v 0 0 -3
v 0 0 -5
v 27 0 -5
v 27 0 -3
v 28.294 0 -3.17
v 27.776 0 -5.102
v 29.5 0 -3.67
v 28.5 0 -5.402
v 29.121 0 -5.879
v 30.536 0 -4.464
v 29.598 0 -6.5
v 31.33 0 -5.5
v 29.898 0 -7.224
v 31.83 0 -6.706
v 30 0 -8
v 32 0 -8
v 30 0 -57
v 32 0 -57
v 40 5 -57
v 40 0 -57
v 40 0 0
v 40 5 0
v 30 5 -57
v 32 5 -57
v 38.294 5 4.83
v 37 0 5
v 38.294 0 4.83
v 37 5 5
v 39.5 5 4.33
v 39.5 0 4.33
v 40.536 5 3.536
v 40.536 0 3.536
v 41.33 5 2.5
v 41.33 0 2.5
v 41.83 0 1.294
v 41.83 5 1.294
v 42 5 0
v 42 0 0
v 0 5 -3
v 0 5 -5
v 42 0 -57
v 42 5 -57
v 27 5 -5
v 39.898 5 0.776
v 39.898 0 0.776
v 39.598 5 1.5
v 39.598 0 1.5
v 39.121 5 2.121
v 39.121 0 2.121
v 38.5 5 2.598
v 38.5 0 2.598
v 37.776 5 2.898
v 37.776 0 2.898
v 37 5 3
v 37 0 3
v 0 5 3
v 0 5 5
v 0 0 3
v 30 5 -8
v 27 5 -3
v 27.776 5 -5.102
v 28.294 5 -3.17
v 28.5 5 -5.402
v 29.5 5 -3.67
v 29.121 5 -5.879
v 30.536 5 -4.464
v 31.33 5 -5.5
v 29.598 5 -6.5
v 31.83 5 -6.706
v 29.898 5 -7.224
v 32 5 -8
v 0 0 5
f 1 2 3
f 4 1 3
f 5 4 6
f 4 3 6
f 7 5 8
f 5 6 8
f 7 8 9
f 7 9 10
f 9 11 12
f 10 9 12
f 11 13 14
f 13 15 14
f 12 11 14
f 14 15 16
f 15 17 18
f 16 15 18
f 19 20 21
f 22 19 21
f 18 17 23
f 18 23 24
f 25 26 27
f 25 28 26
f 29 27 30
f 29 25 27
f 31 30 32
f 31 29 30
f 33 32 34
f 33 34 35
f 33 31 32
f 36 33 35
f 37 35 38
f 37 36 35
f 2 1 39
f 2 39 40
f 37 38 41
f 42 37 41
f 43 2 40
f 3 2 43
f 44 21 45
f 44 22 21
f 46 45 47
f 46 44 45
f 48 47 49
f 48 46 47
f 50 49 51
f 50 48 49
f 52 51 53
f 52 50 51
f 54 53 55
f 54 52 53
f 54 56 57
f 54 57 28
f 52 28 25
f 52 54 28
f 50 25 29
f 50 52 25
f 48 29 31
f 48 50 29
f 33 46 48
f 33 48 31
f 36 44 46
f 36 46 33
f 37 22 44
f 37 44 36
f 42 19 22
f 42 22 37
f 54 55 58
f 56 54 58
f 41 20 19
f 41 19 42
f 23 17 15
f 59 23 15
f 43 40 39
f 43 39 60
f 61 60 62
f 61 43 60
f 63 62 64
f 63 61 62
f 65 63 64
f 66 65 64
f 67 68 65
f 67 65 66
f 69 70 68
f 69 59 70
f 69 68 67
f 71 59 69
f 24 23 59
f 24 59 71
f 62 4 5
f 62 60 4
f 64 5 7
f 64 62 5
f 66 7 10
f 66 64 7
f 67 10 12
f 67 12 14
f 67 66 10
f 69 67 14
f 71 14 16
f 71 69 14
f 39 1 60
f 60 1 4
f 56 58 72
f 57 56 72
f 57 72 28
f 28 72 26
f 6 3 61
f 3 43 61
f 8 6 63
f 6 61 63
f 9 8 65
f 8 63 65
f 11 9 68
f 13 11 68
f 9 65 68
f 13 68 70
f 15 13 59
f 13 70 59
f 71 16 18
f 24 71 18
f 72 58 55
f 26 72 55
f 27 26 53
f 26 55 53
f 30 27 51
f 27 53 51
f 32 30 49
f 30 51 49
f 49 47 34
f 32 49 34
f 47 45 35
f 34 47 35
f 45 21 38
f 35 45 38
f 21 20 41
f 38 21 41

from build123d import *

# Parameters (mm, degrees)
SKETCH_1_W               = 30
SKETCH_1_H               = 2
SKETCH_1_W_2             = 2
SKETCH_1_H_2             = 52
SKETCH_1_W_3             = 12
SKETCH_1_H_3             = 3
EXTRUDE_1_DEPTH          = 5
FILLET_1_R               = 5
FILLET_2_R               = 3
CUT_EXTRUDE_1_DEPTH      = 74.409808609
CUT_EXTRUDE_1_DEPTH_BACK = 74.409808609
SKETCH_2_W               = 12
SKETCH_2_H               = 3


with BuildPart() as part:
    # 草图1 → 凸台-拉伸1 (new body)
    with BuildSketch(Plane(origin=(0, 0, 0), x_dir=(1, 0, 0), z_dir=(0, 1, 0))):
        with Locations((15, 4)):
            Rectangle(SKETCH_1_W, SKETCH_1_H)
        Polygon((0, -5), (40, -5), (40, -3), (32, -3), (30, -3), (0, -3), align=None)
        with Locations((41, -4)):
            Rectangle(SKETCH_1_W_2, SKETCH_1_H)
        Polygon((40, 3), (40, -3), (42, -3), (42, 57), (40, 57), (40, 5), align=None)
        with Locations((31, 31)):
            Rectangle(SKETCH_1_W_2, SKETCH_1_H_2)
        with Locations((31, 4)):
            Rectangle(SKETCH_1_W_2, SKETCH_1_H)
        with Locations((36, 58.5)):
            Rectangle(SKETCH_1_W_3, SKETCH_1_H_3)
    extrude(amount=EXTRUDE_1_DEPTH)

    # 圆角1
    fillet_1_edges = [part.edges().sort_by_distance(p)[0] for p in [
        (42, 2.5, 5),
        (32, 2.5, -3),
    ]]
    fillet(fillet_1_edges, radius=FILLET_1_R)

    # 圆角2
    fillet_2_edges = [part.edges().sort_by_distance(p)[0] for p in [
        (40, 2.5, 3),
        (30, 2.5, -5),
    ]]
    fillet(fillet_2_edges, radius=FILLET_2_R)

    # 草图2 → 切除-拉伸1 (cut, two sides: drawn at the far end of the back side and taken through both)
    with BuildSketch(Plane(origin=(0, 5, 0), x_dir=(1, 0, 0), z_dir=(0, 1, 0)).offset(-CUT_EXTRUDE_1_DEPTH_BACK)):
        with Locations((36, 58.5)):
            Rectangle(SKETCH_2_W, SKETCH_2_H)
    extrude(amount=CUT_EXTRUDE_1_DEPTH + CUT_EXTRUDE_1_DEPTH_BACK, mode=Mode.SUBTRACT)


with BuildPart() as cut_extrude_1_piece_1:
    # of the separate pieces the step leaves, piece 1, a body of its own (cut_extrude_1_pieces)
    add(part.part.solids().sort_by_distance((42, 5, -57))[0])


with BuildPart() as cut_extrude_1_piece_2:
    # of the separate pieces the step leaves, piece 2, a body of its own (cut_extrude_1_pieces)
    add(part.part.solids().sort_by_distance((27, 5, -5))[0])


solid = Compound([cut_extrude_1_piece_1.part, cut_extrude_1_piece_2.part])
